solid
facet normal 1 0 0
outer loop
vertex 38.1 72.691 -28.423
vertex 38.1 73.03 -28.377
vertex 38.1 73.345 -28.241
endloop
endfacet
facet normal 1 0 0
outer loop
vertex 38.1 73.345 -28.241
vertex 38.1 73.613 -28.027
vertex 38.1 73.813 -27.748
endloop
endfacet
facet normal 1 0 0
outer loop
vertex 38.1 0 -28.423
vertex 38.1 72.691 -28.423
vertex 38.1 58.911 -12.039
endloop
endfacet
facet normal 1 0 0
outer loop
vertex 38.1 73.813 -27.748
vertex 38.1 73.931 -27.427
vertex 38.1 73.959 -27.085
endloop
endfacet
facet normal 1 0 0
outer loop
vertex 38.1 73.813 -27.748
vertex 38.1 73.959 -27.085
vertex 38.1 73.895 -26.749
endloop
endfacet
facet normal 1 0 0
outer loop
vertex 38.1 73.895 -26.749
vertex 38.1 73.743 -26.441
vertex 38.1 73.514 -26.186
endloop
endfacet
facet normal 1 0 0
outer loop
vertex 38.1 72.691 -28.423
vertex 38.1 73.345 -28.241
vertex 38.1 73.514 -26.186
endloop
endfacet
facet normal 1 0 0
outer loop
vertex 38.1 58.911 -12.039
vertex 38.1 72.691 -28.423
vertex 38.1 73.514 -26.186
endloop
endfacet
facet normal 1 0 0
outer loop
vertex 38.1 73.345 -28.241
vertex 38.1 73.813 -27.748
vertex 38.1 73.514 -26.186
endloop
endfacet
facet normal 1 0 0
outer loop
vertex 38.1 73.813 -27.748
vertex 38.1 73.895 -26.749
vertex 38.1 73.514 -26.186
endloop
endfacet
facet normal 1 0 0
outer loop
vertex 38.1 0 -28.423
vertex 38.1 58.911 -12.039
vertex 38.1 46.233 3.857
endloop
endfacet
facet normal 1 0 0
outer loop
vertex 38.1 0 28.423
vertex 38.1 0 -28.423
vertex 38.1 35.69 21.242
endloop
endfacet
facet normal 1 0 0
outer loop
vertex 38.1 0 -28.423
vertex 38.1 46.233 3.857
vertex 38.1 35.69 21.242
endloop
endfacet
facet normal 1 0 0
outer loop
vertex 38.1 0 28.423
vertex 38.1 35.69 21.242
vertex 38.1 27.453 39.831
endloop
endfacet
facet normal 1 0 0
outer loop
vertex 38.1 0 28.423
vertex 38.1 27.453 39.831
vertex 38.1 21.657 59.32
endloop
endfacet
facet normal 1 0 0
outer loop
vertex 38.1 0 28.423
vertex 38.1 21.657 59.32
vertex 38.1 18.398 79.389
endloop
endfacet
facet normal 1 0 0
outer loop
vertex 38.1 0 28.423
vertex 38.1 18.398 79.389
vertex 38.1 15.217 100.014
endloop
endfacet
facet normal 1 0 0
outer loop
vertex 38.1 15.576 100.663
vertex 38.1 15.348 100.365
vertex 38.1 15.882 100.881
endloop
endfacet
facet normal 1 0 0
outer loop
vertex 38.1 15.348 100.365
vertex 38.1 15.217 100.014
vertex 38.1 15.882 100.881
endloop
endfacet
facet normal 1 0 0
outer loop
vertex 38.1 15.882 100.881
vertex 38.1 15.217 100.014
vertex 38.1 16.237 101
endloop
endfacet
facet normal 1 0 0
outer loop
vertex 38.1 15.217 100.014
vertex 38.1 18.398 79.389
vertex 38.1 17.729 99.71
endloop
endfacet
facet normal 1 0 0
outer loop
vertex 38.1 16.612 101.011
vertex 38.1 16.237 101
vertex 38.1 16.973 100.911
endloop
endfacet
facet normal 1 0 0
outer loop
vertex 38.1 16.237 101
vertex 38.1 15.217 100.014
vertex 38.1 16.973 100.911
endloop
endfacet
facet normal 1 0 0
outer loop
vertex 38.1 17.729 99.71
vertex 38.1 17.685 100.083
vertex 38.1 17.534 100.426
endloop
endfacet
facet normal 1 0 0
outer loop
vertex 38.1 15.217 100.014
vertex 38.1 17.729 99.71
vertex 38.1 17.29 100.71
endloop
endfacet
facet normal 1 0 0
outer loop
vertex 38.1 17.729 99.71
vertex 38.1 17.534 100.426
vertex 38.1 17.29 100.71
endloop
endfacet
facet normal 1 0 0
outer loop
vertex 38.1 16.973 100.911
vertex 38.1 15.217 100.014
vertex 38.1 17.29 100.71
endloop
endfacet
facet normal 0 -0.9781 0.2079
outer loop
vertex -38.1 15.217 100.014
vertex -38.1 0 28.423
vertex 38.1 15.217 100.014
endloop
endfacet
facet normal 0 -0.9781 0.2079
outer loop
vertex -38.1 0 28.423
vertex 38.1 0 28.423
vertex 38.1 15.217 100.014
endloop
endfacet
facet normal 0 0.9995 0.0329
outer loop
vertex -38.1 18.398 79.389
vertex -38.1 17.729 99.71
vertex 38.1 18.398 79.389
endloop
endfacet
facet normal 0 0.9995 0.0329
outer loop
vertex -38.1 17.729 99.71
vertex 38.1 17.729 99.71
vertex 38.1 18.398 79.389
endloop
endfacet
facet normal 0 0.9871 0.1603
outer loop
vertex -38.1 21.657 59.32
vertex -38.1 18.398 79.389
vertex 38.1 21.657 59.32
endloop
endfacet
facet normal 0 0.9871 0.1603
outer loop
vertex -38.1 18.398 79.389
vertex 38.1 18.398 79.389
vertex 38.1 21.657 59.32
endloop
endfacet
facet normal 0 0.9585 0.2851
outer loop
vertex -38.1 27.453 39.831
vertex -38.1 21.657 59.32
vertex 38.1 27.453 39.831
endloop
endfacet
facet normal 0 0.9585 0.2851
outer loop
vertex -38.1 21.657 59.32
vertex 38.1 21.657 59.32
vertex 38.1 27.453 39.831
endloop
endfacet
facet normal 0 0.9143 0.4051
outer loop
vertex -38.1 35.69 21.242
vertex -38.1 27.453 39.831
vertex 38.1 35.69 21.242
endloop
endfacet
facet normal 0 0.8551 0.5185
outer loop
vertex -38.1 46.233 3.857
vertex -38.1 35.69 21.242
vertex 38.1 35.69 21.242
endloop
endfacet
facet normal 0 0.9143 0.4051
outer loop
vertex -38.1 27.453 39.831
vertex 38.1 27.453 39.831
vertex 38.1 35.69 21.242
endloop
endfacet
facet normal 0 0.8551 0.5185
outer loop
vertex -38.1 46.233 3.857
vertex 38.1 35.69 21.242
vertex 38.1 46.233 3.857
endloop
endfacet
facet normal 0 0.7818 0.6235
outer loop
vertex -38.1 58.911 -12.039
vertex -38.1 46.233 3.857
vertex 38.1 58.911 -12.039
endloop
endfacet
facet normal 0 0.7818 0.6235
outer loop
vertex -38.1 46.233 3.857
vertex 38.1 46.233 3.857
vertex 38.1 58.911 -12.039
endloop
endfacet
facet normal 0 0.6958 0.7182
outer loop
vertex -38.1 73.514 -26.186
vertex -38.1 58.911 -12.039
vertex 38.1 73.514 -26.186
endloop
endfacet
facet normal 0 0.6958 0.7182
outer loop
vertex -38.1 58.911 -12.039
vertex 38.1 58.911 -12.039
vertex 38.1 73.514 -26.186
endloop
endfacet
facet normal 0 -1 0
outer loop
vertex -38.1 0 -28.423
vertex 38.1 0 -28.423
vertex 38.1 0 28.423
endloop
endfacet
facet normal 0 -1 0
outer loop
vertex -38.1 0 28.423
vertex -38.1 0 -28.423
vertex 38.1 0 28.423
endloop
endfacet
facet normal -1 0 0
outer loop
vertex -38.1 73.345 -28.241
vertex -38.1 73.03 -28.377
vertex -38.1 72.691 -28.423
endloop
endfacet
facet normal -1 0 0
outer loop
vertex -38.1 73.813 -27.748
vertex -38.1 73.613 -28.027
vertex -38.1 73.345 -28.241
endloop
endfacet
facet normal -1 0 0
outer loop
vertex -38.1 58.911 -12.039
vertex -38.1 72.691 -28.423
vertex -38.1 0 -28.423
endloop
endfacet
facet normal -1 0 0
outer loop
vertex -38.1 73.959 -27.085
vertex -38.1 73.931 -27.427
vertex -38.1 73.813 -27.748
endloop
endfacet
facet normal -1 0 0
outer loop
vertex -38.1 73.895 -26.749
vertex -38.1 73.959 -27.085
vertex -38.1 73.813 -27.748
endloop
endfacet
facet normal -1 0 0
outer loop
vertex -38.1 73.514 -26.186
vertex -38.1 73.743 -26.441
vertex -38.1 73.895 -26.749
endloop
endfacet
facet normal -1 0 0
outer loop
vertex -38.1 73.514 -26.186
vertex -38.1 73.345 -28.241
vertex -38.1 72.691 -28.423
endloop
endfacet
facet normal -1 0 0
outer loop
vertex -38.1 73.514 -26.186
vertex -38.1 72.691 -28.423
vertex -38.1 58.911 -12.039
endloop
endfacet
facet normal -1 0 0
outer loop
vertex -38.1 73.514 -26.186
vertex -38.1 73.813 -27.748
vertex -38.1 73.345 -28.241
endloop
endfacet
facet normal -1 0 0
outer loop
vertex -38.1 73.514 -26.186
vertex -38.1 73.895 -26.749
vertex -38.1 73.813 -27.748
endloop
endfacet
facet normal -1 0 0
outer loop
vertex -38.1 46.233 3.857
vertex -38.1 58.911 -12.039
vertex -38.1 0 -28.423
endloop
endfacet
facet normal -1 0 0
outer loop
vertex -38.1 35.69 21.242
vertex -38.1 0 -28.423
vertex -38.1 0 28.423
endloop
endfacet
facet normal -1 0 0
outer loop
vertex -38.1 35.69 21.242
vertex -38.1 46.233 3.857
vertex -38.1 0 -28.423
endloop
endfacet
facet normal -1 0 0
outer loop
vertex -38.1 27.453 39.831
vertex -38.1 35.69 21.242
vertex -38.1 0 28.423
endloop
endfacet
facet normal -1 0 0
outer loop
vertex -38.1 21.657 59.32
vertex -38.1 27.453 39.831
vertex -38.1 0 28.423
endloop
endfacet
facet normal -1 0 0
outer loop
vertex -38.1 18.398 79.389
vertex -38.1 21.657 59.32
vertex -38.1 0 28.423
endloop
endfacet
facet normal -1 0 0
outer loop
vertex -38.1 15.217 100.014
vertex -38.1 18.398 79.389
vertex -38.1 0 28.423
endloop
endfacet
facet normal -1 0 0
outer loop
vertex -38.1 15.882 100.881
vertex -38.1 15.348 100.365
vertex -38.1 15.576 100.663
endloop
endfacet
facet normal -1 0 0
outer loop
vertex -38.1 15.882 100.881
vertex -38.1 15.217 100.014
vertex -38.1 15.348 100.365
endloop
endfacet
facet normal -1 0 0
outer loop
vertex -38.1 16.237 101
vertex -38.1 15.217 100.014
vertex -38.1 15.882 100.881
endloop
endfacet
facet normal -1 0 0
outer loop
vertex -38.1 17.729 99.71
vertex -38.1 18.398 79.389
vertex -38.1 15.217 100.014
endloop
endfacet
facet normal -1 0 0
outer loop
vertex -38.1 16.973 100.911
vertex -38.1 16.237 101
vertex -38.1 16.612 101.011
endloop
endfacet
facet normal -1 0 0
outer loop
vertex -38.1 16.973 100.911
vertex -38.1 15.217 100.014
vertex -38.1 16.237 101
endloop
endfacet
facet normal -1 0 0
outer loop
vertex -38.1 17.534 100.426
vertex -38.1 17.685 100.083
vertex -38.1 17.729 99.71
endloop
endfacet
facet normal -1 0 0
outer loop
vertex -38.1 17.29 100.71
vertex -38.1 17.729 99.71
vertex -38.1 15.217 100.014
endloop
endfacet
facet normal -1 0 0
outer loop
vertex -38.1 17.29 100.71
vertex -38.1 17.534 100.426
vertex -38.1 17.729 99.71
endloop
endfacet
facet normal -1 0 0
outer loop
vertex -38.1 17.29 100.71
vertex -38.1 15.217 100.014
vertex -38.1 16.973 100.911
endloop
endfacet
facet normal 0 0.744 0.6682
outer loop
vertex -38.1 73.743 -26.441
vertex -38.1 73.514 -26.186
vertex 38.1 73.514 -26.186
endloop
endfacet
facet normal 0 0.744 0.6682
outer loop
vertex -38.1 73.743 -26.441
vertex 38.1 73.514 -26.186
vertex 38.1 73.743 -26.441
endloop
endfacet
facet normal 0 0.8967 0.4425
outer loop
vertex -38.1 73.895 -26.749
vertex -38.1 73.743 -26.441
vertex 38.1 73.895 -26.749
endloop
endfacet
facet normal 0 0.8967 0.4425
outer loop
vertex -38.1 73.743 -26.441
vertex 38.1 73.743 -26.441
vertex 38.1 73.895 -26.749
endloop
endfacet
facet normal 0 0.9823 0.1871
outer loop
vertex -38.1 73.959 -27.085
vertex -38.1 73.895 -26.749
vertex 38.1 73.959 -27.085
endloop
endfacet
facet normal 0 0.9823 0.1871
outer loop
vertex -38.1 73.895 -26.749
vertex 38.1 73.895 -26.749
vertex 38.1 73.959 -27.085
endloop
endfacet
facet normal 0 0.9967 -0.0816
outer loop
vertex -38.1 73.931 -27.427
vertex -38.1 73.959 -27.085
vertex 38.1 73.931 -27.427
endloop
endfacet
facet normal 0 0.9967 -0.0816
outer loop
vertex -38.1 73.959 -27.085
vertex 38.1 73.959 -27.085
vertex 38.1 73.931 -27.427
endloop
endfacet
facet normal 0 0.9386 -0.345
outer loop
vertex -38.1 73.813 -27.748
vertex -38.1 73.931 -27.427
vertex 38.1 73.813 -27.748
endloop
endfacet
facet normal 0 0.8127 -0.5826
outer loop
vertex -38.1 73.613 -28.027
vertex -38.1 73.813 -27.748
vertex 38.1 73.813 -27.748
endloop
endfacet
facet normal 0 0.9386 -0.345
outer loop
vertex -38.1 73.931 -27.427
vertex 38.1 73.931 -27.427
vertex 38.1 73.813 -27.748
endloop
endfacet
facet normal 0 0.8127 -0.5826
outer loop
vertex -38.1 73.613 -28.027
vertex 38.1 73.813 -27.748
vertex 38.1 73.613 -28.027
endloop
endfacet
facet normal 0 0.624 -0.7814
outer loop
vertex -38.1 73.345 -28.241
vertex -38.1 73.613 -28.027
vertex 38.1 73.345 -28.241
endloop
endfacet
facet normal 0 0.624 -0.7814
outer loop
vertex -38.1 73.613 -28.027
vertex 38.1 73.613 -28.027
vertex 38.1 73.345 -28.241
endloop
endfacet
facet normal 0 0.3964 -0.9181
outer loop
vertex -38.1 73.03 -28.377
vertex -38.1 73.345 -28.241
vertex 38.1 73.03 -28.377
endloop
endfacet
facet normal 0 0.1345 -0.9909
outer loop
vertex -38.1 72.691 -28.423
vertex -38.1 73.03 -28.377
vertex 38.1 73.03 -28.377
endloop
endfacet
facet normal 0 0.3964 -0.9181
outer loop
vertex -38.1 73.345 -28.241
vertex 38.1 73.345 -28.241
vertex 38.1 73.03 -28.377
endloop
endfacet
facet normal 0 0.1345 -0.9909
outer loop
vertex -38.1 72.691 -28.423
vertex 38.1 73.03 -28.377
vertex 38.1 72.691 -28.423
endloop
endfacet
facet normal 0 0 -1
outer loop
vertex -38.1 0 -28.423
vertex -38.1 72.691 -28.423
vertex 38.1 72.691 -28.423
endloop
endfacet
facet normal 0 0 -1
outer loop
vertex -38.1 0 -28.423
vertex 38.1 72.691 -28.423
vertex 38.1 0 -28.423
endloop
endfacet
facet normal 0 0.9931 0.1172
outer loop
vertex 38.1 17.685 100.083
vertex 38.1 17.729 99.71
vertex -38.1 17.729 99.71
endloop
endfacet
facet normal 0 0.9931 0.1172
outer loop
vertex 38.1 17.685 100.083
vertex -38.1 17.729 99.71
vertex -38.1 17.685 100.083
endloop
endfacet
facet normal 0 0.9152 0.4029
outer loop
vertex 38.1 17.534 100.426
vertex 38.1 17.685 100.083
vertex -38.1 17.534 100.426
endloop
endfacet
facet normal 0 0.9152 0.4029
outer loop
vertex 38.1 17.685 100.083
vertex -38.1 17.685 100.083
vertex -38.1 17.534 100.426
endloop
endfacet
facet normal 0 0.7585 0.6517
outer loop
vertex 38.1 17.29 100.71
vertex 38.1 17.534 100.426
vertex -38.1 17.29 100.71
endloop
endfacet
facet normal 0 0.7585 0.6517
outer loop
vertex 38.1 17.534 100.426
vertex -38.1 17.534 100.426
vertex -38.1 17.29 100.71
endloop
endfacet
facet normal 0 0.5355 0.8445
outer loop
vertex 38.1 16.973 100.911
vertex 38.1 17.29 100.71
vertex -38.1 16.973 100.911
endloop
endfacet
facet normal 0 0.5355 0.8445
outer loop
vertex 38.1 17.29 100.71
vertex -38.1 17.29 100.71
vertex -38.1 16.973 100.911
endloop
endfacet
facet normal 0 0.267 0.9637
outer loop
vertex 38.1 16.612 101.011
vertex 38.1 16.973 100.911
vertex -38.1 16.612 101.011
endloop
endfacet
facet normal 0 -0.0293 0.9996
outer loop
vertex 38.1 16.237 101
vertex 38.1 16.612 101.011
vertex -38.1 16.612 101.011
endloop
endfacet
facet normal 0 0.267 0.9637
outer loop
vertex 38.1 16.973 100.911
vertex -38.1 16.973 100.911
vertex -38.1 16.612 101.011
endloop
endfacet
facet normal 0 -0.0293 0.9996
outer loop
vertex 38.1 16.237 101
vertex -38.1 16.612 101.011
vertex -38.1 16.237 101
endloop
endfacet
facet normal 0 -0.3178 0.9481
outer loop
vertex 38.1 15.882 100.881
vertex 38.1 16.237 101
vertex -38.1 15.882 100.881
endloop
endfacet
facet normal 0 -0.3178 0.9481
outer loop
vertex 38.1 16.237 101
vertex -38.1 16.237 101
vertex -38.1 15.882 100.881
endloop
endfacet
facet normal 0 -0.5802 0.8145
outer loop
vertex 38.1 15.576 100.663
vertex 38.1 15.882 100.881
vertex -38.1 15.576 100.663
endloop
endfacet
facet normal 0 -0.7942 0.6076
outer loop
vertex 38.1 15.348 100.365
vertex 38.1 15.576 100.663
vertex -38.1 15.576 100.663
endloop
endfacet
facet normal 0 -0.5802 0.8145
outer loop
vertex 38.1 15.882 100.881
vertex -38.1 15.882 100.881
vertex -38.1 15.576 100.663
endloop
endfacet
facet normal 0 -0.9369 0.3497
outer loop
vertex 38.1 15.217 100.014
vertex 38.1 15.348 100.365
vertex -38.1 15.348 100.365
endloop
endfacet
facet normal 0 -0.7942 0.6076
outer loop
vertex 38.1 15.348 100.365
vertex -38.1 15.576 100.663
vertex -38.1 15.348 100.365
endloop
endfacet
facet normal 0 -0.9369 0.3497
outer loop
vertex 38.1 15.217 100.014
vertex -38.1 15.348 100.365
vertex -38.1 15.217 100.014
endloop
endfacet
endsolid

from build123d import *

# Parameters (mm, degrees)
BOSS_EXTRUDE1_DEPTH = 38.1
FILLET1_R           = 1.27


with BuildPart() as part:
    # Sketch1 → Boss-Extrude1 (new, symmetric)
    with BuildSketch(Plane(origin=(0, 0, 0), x_dir=(0, 0, -1), z_dir=(1, 0, 0))):
        with BuildLine():
            Line((28.422826333, 0), (-28.422826333, 0))
            Line((-28.422826333, 0), (-127.802622568, 21.123827787))
            ThreePointArc((-127.802622568, 21.123827787), (-41.944172269, 26.690897226), (28.422826333, 76.2))
            Line((28.422826333, 76.2), (28.422826333, 0))
        make_face()
    extrude(amount=BOSS_EXTRUDE1_DEPTH, both=True)

    # Fillet1
    fillet1_edges = [part.edges().sort_by_distance(p)[0] for p in [
        (0, 76.2, -28.422826333),
    ]]
    fillet(fillet1_edges, radius=FILLET1_R)
    fillet1_2_edges = [part.edges().sort_by_distance(p)[0] for p in [
        (0, 21.123827787, 127.802622568),
    ]]
    fillet(fillet1_2_edges, radius=FILLET1_R)


solid = part.part
